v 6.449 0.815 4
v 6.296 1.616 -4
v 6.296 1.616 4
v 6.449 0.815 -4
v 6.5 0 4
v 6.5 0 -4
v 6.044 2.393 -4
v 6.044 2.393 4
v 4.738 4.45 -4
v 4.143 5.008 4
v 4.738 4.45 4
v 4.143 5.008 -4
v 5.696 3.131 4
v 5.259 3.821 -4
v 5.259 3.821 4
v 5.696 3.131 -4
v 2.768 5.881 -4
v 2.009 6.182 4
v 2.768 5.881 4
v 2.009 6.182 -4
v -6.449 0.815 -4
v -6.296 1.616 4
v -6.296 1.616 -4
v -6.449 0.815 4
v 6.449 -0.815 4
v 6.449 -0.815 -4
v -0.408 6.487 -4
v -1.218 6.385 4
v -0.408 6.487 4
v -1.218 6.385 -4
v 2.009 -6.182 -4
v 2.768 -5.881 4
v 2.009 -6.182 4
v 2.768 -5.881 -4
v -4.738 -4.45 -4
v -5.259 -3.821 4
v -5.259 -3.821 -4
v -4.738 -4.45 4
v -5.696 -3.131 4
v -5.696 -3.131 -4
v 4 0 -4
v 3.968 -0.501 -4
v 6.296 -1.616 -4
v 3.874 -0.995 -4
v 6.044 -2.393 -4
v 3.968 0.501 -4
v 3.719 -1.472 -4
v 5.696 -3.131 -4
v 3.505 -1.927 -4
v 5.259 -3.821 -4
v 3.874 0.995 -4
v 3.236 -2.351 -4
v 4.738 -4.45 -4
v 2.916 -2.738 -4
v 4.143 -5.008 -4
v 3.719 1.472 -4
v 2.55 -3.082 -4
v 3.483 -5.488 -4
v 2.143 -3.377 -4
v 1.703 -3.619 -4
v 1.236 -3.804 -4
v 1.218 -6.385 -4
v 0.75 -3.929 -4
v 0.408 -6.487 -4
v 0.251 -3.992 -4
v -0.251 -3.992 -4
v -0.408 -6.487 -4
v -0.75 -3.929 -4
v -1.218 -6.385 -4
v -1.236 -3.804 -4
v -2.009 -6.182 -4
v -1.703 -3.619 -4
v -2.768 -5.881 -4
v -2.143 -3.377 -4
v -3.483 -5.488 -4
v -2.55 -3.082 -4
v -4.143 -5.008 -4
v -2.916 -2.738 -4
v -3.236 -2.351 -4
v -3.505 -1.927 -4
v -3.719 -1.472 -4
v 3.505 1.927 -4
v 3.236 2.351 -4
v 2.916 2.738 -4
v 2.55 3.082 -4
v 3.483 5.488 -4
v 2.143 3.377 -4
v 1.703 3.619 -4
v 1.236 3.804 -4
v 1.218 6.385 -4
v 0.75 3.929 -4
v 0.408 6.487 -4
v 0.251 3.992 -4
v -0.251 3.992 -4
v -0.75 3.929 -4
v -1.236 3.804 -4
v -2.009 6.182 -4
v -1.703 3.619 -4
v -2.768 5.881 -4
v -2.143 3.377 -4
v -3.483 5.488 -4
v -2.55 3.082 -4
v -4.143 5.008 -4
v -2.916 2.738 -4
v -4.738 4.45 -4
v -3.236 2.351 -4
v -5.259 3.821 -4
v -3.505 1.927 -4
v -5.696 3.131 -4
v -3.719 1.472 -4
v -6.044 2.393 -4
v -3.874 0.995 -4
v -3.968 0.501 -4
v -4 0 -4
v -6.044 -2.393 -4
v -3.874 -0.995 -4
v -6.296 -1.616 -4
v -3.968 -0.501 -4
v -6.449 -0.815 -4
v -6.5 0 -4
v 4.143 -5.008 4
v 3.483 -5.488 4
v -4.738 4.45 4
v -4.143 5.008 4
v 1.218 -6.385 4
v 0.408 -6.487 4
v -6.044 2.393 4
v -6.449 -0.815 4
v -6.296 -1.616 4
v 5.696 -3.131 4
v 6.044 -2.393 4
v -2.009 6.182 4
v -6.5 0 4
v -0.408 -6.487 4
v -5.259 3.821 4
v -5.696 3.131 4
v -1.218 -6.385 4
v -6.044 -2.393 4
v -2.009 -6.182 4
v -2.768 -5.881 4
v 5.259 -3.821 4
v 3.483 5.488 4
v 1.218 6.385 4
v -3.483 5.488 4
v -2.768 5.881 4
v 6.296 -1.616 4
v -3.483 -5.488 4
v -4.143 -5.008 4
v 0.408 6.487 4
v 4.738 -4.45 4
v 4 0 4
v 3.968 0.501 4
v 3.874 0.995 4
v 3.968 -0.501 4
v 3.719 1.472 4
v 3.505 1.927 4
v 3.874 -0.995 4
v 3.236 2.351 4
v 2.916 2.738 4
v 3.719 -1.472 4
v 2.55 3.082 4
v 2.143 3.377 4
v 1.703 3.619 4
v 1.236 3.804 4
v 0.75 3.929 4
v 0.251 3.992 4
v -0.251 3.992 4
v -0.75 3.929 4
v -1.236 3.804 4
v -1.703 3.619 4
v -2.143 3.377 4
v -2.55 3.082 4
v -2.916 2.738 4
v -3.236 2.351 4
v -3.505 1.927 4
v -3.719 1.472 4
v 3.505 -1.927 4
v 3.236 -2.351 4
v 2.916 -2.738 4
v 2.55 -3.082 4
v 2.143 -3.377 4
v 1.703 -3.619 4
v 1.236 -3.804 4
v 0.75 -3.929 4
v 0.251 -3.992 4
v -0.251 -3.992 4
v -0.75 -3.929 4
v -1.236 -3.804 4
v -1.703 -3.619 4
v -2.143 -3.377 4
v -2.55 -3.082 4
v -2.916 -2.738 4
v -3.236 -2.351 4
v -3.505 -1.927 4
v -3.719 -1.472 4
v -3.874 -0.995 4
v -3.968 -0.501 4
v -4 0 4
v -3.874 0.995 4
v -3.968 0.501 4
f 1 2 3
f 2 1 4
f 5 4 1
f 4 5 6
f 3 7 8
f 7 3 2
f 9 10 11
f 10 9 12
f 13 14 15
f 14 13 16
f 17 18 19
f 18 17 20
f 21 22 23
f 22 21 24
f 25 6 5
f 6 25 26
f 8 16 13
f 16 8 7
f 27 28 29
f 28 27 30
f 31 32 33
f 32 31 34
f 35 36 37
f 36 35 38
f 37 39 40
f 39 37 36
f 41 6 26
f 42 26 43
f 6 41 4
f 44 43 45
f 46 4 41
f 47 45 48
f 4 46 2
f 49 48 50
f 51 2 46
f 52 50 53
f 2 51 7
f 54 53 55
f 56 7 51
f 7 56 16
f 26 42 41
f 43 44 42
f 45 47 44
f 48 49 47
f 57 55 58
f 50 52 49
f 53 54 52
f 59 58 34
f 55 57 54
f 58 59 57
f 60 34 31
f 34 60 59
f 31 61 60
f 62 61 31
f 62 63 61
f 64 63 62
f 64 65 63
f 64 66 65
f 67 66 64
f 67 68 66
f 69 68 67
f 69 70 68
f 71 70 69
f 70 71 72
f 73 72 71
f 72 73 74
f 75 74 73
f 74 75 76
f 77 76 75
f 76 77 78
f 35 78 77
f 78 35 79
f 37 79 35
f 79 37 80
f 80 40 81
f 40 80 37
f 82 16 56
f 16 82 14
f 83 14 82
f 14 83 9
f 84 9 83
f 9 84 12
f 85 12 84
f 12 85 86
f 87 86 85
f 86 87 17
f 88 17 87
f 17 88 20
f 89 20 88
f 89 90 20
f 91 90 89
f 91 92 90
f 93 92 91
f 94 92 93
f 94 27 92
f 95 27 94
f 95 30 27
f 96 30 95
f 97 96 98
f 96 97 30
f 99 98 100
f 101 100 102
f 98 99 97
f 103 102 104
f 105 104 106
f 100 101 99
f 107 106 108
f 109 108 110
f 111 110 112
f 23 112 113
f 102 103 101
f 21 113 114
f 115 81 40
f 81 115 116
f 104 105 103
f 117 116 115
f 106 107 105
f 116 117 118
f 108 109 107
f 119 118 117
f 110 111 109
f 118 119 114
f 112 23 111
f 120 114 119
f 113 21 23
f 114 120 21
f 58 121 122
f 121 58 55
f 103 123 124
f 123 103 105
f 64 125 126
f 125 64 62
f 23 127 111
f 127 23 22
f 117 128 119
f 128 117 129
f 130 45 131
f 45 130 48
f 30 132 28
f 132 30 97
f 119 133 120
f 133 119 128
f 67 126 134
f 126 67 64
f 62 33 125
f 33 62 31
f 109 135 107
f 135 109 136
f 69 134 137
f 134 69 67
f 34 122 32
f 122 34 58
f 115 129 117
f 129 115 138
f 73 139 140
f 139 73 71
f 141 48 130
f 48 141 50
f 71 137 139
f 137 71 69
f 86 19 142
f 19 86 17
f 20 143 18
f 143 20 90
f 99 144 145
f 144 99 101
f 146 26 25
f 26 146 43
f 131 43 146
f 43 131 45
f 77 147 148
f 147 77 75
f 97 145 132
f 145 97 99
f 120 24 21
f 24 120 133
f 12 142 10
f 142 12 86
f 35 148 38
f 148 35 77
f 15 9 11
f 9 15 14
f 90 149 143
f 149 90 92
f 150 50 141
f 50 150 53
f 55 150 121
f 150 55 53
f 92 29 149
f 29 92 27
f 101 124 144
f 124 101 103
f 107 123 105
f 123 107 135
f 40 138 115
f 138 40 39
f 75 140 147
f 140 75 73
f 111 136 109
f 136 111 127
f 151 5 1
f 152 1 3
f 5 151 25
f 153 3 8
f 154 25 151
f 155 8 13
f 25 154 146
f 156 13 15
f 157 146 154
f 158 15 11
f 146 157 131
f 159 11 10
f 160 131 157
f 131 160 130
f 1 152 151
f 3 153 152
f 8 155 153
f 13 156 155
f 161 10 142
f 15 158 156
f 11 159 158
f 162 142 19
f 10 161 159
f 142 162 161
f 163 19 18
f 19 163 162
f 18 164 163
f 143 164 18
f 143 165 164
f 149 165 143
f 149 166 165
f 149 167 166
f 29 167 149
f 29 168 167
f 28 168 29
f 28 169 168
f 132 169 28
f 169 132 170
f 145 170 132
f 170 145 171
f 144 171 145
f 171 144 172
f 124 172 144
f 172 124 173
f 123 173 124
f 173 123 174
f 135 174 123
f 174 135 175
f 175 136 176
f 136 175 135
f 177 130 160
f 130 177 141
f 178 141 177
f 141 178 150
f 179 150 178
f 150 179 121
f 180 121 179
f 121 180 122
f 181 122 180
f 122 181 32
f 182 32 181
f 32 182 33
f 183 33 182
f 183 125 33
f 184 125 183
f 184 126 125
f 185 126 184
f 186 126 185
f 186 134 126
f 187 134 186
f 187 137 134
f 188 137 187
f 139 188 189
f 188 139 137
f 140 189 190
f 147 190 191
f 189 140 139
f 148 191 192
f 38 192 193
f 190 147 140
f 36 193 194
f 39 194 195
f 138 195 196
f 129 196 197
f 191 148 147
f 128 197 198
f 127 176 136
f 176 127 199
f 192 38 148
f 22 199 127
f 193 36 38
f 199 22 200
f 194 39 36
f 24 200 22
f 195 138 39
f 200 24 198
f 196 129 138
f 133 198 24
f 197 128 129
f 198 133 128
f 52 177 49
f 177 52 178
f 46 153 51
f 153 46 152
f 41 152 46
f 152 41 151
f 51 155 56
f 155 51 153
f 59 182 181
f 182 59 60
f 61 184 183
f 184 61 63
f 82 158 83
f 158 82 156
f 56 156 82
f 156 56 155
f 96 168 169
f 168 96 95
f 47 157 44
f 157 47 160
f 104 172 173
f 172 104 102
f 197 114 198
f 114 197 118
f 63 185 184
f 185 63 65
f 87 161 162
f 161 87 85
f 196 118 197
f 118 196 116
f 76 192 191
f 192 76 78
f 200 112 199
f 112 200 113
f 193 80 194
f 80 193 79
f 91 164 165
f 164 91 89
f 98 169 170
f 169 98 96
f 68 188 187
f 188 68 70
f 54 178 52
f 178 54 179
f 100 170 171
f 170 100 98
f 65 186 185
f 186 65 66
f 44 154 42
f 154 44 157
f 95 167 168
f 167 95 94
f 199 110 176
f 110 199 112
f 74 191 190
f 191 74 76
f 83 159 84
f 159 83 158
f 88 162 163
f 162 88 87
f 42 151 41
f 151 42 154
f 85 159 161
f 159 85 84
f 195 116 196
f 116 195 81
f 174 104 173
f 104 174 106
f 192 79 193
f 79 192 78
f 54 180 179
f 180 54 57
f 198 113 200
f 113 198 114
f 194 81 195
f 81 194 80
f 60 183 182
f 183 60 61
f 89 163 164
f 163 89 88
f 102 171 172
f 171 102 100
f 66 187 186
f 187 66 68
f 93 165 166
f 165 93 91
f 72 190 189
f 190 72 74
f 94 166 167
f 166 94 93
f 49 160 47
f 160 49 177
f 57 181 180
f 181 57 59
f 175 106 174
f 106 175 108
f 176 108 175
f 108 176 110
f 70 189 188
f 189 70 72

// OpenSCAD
$fn = 50;


difference() {
	union() {
		translate(v = [0, 0, -4.0000000000]) {
			cylinder(h = 8, r = 6.5000000000);
		}
	}
	union() {
		translate(v = [0, 0, -100.0000000000]) {
			cylinder(h = 200, r = 4.0000000000);
		}
	}
}
